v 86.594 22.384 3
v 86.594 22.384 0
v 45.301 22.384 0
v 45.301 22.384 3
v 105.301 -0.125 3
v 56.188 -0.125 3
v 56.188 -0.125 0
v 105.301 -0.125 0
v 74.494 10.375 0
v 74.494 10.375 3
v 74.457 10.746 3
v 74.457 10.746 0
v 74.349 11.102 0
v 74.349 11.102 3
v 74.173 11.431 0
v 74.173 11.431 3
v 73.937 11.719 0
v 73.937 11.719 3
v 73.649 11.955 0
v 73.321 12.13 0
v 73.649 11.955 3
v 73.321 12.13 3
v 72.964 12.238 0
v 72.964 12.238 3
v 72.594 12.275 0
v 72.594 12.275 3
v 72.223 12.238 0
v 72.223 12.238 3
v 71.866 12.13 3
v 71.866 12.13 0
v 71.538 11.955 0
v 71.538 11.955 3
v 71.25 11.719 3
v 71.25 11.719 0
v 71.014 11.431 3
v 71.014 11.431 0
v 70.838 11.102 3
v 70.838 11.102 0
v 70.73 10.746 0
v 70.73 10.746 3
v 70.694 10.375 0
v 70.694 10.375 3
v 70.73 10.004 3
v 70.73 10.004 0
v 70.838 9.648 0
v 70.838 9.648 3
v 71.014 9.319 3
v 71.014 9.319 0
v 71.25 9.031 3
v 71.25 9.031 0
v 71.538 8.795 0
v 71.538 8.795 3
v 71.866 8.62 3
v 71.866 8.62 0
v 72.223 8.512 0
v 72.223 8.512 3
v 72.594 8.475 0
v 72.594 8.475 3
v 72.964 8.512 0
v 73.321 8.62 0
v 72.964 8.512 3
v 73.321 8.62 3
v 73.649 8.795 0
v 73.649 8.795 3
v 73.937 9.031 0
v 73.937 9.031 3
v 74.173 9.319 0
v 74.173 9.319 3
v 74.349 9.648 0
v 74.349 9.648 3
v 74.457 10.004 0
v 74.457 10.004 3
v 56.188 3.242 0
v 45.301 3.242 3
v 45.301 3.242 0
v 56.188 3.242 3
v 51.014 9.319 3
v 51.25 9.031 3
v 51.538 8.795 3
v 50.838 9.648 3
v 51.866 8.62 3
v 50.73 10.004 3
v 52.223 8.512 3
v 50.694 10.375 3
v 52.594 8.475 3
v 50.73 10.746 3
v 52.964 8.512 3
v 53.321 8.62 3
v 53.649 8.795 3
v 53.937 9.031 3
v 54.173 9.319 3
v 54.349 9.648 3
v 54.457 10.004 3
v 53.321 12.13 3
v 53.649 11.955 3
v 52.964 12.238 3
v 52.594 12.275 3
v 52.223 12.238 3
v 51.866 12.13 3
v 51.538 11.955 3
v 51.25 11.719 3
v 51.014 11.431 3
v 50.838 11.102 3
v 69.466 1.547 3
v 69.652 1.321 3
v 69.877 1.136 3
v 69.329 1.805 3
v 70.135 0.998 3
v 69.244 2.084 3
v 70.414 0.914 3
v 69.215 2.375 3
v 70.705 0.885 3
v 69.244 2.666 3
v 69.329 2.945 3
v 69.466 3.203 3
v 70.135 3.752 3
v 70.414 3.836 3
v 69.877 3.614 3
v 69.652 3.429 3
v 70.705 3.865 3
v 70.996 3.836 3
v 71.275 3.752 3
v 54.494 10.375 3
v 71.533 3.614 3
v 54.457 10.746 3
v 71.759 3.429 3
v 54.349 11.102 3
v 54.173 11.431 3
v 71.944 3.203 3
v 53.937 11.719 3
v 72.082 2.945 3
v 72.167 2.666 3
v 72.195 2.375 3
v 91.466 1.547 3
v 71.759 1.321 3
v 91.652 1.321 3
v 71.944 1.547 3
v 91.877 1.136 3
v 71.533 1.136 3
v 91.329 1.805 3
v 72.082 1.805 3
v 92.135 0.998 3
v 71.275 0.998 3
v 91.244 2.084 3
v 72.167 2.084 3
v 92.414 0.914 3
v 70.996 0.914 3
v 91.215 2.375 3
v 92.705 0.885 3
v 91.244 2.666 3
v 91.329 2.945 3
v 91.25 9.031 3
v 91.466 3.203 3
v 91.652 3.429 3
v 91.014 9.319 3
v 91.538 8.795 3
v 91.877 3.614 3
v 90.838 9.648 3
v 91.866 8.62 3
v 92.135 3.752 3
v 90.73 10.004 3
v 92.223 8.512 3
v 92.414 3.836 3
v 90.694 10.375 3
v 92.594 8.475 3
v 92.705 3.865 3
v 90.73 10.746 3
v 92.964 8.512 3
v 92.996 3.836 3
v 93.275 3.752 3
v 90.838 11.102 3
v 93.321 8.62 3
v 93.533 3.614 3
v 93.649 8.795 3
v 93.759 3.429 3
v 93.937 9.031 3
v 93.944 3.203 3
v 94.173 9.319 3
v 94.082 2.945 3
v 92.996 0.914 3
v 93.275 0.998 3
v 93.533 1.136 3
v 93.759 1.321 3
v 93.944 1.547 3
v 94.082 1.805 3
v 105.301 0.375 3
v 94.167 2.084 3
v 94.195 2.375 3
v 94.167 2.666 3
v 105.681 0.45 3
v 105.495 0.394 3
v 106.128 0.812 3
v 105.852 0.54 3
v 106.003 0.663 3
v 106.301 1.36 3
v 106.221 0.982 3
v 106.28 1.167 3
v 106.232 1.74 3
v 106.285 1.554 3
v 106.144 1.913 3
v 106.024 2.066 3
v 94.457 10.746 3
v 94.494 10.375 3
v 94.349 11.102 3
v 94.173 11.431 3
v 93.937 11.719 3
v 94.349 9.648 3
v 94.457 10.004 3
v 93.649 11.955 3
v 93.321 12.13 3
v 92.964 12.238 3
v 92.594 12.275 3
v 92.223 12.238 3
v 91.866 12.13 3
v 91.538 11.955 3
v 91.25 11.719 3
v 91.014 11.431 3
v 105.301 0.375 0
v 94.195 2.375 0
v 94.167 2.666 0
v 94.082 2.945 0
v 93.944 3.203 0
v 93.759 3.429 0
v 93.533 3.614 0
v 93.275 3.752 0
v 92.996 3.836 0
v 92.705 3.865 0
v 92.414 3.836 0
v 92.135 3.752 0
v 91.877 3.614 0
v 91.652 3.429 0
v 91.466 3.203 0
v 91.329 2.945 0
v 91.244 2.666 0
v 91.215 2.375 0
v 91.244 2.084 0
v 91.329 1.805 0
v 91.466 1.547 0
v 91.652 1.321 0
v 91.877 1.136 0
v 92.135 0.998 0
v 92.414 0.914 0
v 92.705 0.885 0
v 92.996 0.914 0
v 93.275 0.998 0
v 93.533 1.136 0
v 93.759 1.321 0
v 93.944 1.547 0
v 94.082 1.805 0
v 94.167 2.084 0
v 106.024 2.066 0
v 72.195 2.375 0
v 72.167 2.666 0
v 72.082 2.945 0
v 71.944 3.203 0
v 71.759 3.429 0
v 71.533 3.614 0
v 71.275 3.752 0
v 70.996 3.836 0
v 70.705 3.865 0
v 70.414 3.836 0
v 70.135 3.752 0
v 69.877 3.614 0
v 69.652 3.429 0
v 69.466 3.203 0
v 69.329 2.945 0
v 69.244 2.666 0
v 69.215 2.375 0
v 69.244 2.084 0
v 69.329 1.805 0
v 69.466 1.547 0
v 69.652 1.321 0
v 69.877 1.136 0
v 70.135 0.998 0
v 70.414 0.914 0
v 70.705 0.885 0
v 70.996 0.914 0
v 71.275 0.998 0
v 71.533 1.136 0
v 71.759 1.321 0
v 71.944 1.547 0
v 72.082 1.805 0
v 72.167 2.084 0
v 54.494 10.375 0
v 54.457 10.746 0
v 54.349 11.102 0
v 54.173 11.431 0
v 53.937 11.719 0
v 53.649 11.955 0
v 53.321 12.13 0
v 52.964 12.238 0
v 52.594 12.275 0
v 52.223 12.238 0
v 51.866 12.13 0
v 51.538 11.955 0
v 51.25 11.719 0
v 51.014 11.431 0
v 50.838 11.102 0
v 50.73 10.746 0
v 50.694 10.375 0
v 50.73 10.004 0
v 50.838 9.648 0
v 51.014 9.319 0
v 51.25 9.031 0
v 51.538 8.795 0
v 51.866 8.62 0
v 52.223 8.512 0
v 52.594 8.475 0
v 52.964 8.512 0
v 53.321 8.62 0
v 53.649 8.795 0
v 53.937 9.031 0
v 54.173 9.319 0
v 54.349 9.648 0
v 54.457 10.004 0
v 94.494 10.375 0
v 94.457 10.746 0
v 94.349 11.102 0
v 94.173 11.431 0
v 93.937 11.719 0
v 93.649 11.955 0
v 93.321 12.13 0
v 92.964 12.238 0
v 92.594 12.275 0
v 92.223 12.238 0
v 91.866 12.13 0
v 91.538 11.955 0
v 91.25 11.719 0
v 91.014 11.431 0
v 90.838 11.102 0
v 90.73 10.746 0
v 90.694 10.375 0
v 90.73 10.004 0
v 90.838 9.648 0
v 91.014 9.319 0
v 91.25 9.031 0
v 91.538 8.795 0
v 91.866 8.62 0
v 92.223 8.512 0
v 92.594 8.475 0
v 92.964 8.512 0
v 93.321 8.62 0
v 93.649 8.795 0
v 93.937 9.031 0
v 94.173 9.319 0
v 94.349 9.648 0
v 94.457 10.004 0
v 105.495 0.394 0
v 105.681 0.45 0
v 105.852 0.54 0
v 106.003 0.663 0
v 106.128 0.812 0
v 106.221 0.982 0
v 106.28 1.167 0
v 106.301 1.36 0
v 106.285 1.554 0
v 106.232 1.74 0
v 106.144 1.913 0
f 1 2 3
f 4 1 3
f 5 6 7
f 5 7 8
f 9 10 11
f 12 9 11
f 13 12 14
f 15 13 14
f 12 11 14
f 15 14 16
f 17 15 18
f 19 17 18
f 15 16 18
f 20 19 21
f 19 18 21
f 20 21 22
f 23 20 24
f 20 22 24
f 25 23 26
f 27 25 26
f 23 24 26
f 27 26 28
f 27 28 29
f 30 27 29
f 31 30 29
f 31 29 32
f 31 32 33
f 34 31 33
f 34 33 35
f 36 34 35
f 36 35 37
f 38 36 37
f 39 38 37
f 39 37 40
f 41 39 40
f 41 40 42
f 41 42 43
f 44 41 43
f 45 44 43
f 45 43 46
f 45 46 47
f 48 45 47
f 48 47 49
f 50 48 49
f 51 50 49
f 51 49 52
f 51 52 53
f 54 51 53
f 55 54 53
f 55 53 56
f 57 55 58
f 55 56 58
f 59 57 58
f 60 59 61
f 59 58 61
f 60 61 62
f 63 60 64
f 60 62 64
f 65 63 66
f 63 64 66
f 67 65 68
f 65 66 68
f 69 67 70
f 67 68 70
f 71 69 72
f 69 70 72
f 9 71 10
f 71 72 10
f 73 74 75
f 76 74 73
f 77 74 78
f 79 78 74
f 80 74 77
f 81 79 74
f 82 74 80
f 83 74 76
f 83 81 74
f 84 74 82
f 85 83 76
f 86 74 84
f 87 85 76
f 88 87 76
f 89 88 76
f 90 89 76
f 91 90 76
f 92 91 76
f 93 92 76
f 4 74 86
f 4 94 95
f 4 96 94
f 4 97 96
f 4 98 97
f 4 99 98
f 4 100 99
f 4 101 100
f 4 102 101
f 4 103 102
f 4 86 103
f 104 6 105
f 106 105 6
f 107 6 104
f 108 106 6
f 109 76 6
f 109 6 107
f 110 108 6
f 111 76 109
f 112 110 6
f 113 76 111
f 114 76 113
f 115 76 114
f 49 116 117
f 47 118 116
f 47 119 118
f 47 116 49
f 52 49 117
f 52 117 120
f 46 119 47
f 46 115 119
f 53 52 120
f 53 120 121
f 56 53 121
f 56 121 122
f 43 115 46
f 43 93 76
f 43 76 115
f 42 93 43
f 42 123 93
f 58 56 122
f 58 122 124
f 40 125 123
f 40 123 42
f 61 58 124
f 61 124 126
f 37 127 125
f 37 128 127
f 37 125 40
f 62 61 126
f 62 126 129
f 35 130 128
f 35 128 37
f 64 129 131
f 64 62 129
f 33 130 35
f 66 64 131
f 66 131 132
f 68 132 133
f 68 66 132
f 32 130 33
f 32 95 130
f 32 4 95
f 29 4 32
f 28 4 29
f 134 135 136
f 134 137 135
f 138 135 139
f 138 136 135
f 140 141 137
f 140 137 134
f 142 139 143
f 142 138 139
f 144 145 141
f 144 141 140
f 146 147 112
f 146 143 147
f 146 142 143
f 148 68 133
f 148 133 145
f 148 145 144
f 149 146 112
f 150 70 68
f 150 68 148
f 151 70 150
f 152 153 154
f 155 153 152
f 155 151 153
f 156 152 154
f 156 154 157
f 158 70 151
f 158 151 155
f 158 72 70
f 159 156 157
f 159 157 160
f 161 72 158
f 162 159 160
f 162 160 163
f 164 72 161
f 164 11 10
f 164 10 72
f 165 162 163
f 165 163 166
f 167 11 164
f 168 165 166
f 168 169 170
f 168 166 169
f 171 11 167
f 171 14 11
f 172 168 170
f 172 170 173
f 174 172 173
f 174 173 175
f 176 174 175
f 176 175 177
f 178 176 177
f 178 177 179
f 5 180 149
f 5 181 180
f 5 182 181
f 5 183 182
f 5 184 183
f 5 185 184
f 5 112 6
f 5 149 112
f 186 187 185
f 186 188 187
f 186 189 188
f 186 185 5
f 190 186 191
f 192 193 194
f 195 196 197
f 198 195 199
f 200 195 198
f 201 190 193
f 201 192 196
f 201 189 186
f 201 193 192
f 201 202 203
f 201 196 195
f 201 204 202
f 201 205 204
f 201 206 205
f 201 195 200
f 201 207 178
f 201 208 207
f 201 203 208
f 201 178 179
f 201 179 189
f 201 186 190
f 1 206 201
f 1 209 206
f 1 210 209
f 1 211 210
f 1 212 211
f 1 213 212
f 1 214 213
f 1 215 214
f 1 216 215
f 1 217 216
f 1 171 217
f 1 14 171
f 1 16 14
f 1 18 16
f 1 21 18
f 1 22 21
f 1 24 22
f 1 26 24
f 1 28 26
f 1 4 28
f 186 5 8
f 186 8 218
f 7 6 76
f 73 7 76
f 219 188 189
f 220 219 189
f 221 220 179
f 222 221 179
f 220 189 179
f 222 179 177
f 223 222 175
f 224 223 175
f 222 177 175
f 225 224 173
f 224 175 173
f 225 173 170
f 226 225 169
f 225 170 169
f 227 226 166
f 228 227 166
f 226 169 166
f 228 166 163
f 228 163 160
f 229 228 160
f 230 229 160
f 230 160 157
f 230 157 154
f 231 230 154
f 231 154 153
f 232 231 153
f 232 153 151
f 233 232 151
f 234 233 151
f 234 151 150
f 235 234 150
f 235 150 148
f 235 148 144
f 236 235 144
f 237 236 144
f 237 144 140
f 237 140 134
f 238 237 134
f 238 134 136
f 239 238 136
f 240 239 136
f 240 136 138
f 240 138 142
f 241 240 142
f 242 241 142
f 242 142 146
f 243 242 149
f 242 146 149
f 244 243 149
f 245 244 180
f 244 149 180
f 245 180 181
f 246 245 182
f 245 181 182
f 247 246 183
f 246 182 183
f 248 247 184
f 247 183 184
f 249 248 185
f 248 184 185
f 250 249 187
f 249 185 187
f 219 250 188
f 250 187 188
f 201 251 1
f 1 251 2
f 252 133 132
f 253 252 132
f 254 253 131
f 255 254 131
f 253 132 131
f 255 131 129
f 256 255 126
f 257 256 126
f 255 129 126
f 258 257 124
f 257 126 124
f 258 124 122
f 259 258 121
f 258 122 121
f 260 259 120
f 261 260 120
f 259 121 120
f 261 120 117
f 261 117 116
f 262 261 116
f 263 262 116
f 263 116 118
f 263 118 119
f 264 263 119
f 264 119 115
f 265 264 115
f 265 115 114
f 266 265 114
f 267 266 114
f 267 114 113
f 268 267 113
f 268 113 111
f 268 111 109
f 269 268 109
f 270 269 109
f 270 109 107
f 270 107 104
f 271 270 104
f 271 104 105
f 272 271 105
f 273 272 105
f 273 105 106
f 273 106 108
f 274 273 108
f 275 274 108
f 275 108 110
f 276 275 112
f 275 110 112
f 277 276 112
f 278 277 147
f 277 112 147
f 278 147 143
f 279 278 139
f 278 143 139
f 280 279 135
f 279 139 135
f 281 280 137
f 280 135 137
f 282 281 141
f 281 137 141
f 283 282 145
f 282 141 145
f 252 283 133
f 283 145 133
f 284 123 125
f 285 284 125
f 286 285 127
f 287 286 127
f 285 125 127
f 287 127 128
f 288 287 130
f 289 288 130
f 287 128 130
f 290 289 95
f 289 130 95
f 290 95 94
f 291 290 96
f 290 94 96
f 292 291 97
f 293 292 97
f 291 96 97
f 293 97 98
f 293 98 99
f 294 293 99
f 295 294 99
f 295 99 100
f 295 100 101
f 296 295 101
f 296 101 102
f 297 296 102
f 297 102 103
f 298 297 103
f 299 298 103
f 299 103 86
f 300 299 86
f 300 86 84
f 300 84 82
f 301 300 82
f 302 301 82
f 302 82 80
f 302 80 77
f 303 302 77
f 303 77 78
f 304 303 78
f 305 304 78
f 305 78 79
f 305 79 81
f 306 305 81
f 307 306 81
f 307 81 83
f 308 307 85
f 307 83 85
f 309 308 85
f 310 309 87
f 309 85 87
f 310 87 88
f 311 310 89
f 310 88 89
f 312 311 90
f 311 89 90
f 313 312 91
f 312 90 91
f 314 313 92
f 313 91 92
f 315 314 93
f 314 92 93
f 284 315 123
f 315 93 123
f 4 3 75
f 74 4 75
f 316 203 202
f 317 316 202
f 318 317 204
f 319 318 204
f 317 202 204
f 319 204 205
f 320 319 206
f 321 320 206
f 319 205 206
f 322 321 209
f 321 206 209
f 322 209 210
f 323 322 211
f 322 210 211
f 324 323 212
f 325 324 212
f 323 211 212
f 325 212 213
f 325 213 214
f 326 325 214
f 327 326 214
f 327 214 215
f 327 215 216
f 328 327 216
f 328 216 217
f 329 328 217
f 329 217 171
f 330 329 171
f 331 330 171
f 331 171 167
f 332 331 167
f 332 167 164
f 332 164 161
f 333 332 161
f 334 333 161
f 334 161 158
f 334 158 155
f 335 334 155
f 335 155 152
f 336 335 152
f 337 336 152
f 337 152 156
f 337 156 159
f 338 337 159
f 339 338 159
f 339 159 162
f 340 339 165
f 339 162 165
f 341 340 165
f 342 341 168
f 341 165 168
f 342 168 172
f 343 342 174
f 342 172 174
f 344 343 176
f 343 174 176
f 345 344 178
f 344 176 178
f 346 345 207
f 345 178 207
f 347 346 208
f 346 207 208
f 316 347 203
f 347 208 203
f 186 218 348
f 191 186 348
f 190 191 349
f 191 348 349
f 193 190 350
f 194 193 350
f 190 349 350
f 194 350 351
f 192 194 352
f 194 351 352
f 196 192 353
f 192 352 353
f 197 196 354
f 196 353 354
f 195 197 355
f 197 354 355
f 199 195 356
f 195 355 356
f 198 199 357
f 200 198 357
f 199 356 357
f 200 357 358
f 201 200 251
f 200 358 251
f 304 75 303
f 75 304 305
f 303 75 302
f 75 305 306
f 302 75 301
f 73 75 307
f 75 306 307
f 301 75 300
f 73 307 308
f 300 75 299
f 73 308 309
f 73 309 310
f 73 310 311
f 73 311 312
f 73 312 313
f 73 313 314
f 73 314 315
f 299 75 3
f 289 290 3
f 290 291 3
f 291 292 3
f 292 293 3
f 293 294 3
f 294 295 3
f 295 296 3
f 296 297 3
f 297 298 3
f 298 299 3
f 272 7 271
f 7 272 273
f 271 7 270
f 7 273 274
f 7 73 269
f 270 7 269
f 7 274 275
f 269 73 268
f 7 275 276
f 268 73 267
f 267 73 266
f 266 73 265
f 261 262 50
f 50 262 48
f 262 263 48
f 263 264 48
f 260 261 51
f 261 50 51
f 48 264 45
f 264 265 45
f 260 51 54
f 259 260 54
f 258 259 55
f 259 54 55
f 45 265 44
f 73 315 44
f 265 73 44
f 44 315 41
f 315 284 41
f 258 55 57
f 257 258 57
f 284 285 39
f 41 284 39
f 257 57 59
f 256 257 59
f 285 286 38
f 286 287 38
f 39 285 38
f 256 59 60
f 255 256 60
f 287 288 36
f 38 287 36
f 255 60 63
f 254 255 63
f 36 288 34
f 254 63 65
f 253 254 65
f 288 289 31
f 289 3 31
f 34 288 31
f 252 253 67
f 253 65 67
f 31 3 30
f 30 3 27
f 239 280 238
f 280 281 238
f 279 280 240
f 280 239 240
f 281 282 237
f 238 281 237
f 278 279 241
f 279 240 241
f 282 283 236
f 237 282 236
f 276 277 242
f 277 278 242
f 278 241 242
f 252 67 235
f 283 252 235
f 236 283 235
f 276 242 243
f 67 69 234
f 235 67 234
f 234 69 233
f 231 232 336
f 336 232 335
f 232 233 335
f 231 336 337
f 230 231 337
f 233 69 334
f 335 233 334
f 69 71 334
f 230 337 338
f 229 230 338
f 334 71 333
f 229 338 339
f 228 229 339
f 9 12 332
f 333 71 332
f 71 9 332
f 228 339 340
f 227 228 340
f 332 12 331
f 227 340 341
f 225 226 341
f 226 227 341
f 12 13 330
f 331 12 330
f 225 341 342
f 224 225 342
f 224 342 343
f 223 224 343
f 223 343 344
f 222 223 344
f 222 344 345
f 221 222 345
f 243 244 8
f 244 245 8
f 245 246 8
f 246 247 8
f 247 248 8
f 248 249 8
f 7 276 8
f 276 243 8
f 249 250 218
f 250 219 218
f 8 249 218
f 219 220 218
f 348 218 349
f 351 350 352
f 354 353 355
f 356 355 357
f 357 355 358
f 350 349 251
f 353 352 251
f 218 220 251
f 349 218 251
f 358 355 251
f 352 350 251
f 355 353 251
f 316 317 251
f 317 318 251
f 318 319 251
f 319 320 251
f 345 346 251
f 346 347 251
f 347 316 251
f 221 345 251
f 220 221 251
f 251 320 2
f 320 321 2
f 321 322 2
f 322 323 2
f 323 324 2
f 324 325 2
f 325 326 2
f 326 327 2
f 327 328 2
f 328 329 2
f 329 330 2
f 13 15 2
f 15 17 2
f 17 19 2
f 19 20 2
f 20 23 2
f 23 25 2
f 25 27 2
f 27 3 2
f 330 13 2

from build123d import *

# Parameters (mm, degrees)
EXTRUDE_1_DEPTH          = 3
SKETCH_2_W               = 10.886343204
SKETCH_2_H               = 8.708921112
CUT_EXTRUDE_1_DEPTH      = 1
CUT_EXTRUDE_1_DEPTH_BACK = 4
SKETCH_3_R               = 1.9
CUT_EXTRUDE_2_DEPTH      = 1
CUT_EXTRUDE_2_DEPTH_BACK = 4
SKETCH_4_R               = 1.49
CUT_EXTRUDE_3_DEPTH      = 1
CUT_EXTRUDE_3_DEPTH_BACK = 4
SKETCH_5_W               = 49.113656796
SKETCH_5_H               = 0.5
EXTRUDE_2_DEPTH          = 3


with BuildPart() as part:
    # Эскиз1 → Бобышка-Вытянуть1 (new body)
    with BuildSketch(Plane.XY):
        with BuildLine():
            Line((45.301358773, 22.383876488), (45.301358773, -1.452573816))
            Line((45.301358773, -1.452573816), (53, 0))
            Line((53, 0), (53.661481565, 0.375))
            Line((53.661481565, 0.375), (105.301358773, 0.375))
            ThreePointArc((105.301358773, 0.375), (106.2209108, 0.982031719), (106.024068331, 2.066151861))
            Line((106.024068331, 2.066151861), (86.593533576, 22.383876488))
            Line((86.593533576, 22.383876488), (45.301358773, 22.383876488))
        make_face()
    extrude(amount=EXTRUDE_1_DEPTH)

    # Эскиз2 → Вырез-Вытянуть1 (cut, two sides)
    with BuildSketch(Plane.XY.offset(3)) as cut_extrude_1_sk:
        with Locations((50.744530375, -1.111990753)):
            Rectangle(SKETCH_2_W, SKETCH_2_H)
    extrude(amount=CUT_EXTRUDE_1_DEPTH, mode=Mode.SUBTRACT)
    extrude(cut_extrude_1_sk.sketch, amount=-CUT_EXTRUDE_1_DEPTH_BACK, mode=Mode.SUBTRACT)

    # Эскиз3 → Вырез-Вытянуть2 (cut, two sides)
    with BuildSketch(Plane.XY.offset(3)) as cut_extrude_2_sk:
        with Locations((52.593533576, 10.375)):
            Circle(SKETCH_3_R)
        with Locations((72.593533576, 10.375)):
            Circle(SKETCH_3_R)
        with Locations((92.593533576, 10.375)):
            Circle(SKETCH_3_R)
    extrude(amount=CUT_EXTRUDE_2_DEPTH, mode=Mode.SUBTRACT)
    extrude(cut_extrude_2_sk.sketch, amount=-CUT_EXTRUDE_2_DEPTH_BACK, mode=Mode.SUBTRACT)

    # Эскиз4 → Вырез-Вытянуть3 (cut, two sides)
    with BuildSketch(Plane.XY.offset(3)) as cut_extrude_3_sk:
        with Locations((92.705183178, 2.375)):
            Circle(SKETCH_4_R)
        with Locations((70.705183178, 2.375)):
            Circle(SKETCH_4_R)
    extrude(amount=CUT_EXTRUDE_3_DEPTH, mode=Mode.SUBTRACT)
    extrude(cut_extrude_3_sk.sketch, amount=-CUT_EXTRUDE_3_DEPTH_BACK, mode=Mode.SUBTRACT)

    # Эскиз5 → Бобышка-Вытянуть2 (add)
    with BuildSketch(Plane.XY.offset(3)):
        with Locations((80.744530375, 0.125)):
            Rectangle(SKETCH_5_W, SKETCH_5_H)
    extrude(amount=-EXTRUDE_2_DEPTH)


solid = part.part
